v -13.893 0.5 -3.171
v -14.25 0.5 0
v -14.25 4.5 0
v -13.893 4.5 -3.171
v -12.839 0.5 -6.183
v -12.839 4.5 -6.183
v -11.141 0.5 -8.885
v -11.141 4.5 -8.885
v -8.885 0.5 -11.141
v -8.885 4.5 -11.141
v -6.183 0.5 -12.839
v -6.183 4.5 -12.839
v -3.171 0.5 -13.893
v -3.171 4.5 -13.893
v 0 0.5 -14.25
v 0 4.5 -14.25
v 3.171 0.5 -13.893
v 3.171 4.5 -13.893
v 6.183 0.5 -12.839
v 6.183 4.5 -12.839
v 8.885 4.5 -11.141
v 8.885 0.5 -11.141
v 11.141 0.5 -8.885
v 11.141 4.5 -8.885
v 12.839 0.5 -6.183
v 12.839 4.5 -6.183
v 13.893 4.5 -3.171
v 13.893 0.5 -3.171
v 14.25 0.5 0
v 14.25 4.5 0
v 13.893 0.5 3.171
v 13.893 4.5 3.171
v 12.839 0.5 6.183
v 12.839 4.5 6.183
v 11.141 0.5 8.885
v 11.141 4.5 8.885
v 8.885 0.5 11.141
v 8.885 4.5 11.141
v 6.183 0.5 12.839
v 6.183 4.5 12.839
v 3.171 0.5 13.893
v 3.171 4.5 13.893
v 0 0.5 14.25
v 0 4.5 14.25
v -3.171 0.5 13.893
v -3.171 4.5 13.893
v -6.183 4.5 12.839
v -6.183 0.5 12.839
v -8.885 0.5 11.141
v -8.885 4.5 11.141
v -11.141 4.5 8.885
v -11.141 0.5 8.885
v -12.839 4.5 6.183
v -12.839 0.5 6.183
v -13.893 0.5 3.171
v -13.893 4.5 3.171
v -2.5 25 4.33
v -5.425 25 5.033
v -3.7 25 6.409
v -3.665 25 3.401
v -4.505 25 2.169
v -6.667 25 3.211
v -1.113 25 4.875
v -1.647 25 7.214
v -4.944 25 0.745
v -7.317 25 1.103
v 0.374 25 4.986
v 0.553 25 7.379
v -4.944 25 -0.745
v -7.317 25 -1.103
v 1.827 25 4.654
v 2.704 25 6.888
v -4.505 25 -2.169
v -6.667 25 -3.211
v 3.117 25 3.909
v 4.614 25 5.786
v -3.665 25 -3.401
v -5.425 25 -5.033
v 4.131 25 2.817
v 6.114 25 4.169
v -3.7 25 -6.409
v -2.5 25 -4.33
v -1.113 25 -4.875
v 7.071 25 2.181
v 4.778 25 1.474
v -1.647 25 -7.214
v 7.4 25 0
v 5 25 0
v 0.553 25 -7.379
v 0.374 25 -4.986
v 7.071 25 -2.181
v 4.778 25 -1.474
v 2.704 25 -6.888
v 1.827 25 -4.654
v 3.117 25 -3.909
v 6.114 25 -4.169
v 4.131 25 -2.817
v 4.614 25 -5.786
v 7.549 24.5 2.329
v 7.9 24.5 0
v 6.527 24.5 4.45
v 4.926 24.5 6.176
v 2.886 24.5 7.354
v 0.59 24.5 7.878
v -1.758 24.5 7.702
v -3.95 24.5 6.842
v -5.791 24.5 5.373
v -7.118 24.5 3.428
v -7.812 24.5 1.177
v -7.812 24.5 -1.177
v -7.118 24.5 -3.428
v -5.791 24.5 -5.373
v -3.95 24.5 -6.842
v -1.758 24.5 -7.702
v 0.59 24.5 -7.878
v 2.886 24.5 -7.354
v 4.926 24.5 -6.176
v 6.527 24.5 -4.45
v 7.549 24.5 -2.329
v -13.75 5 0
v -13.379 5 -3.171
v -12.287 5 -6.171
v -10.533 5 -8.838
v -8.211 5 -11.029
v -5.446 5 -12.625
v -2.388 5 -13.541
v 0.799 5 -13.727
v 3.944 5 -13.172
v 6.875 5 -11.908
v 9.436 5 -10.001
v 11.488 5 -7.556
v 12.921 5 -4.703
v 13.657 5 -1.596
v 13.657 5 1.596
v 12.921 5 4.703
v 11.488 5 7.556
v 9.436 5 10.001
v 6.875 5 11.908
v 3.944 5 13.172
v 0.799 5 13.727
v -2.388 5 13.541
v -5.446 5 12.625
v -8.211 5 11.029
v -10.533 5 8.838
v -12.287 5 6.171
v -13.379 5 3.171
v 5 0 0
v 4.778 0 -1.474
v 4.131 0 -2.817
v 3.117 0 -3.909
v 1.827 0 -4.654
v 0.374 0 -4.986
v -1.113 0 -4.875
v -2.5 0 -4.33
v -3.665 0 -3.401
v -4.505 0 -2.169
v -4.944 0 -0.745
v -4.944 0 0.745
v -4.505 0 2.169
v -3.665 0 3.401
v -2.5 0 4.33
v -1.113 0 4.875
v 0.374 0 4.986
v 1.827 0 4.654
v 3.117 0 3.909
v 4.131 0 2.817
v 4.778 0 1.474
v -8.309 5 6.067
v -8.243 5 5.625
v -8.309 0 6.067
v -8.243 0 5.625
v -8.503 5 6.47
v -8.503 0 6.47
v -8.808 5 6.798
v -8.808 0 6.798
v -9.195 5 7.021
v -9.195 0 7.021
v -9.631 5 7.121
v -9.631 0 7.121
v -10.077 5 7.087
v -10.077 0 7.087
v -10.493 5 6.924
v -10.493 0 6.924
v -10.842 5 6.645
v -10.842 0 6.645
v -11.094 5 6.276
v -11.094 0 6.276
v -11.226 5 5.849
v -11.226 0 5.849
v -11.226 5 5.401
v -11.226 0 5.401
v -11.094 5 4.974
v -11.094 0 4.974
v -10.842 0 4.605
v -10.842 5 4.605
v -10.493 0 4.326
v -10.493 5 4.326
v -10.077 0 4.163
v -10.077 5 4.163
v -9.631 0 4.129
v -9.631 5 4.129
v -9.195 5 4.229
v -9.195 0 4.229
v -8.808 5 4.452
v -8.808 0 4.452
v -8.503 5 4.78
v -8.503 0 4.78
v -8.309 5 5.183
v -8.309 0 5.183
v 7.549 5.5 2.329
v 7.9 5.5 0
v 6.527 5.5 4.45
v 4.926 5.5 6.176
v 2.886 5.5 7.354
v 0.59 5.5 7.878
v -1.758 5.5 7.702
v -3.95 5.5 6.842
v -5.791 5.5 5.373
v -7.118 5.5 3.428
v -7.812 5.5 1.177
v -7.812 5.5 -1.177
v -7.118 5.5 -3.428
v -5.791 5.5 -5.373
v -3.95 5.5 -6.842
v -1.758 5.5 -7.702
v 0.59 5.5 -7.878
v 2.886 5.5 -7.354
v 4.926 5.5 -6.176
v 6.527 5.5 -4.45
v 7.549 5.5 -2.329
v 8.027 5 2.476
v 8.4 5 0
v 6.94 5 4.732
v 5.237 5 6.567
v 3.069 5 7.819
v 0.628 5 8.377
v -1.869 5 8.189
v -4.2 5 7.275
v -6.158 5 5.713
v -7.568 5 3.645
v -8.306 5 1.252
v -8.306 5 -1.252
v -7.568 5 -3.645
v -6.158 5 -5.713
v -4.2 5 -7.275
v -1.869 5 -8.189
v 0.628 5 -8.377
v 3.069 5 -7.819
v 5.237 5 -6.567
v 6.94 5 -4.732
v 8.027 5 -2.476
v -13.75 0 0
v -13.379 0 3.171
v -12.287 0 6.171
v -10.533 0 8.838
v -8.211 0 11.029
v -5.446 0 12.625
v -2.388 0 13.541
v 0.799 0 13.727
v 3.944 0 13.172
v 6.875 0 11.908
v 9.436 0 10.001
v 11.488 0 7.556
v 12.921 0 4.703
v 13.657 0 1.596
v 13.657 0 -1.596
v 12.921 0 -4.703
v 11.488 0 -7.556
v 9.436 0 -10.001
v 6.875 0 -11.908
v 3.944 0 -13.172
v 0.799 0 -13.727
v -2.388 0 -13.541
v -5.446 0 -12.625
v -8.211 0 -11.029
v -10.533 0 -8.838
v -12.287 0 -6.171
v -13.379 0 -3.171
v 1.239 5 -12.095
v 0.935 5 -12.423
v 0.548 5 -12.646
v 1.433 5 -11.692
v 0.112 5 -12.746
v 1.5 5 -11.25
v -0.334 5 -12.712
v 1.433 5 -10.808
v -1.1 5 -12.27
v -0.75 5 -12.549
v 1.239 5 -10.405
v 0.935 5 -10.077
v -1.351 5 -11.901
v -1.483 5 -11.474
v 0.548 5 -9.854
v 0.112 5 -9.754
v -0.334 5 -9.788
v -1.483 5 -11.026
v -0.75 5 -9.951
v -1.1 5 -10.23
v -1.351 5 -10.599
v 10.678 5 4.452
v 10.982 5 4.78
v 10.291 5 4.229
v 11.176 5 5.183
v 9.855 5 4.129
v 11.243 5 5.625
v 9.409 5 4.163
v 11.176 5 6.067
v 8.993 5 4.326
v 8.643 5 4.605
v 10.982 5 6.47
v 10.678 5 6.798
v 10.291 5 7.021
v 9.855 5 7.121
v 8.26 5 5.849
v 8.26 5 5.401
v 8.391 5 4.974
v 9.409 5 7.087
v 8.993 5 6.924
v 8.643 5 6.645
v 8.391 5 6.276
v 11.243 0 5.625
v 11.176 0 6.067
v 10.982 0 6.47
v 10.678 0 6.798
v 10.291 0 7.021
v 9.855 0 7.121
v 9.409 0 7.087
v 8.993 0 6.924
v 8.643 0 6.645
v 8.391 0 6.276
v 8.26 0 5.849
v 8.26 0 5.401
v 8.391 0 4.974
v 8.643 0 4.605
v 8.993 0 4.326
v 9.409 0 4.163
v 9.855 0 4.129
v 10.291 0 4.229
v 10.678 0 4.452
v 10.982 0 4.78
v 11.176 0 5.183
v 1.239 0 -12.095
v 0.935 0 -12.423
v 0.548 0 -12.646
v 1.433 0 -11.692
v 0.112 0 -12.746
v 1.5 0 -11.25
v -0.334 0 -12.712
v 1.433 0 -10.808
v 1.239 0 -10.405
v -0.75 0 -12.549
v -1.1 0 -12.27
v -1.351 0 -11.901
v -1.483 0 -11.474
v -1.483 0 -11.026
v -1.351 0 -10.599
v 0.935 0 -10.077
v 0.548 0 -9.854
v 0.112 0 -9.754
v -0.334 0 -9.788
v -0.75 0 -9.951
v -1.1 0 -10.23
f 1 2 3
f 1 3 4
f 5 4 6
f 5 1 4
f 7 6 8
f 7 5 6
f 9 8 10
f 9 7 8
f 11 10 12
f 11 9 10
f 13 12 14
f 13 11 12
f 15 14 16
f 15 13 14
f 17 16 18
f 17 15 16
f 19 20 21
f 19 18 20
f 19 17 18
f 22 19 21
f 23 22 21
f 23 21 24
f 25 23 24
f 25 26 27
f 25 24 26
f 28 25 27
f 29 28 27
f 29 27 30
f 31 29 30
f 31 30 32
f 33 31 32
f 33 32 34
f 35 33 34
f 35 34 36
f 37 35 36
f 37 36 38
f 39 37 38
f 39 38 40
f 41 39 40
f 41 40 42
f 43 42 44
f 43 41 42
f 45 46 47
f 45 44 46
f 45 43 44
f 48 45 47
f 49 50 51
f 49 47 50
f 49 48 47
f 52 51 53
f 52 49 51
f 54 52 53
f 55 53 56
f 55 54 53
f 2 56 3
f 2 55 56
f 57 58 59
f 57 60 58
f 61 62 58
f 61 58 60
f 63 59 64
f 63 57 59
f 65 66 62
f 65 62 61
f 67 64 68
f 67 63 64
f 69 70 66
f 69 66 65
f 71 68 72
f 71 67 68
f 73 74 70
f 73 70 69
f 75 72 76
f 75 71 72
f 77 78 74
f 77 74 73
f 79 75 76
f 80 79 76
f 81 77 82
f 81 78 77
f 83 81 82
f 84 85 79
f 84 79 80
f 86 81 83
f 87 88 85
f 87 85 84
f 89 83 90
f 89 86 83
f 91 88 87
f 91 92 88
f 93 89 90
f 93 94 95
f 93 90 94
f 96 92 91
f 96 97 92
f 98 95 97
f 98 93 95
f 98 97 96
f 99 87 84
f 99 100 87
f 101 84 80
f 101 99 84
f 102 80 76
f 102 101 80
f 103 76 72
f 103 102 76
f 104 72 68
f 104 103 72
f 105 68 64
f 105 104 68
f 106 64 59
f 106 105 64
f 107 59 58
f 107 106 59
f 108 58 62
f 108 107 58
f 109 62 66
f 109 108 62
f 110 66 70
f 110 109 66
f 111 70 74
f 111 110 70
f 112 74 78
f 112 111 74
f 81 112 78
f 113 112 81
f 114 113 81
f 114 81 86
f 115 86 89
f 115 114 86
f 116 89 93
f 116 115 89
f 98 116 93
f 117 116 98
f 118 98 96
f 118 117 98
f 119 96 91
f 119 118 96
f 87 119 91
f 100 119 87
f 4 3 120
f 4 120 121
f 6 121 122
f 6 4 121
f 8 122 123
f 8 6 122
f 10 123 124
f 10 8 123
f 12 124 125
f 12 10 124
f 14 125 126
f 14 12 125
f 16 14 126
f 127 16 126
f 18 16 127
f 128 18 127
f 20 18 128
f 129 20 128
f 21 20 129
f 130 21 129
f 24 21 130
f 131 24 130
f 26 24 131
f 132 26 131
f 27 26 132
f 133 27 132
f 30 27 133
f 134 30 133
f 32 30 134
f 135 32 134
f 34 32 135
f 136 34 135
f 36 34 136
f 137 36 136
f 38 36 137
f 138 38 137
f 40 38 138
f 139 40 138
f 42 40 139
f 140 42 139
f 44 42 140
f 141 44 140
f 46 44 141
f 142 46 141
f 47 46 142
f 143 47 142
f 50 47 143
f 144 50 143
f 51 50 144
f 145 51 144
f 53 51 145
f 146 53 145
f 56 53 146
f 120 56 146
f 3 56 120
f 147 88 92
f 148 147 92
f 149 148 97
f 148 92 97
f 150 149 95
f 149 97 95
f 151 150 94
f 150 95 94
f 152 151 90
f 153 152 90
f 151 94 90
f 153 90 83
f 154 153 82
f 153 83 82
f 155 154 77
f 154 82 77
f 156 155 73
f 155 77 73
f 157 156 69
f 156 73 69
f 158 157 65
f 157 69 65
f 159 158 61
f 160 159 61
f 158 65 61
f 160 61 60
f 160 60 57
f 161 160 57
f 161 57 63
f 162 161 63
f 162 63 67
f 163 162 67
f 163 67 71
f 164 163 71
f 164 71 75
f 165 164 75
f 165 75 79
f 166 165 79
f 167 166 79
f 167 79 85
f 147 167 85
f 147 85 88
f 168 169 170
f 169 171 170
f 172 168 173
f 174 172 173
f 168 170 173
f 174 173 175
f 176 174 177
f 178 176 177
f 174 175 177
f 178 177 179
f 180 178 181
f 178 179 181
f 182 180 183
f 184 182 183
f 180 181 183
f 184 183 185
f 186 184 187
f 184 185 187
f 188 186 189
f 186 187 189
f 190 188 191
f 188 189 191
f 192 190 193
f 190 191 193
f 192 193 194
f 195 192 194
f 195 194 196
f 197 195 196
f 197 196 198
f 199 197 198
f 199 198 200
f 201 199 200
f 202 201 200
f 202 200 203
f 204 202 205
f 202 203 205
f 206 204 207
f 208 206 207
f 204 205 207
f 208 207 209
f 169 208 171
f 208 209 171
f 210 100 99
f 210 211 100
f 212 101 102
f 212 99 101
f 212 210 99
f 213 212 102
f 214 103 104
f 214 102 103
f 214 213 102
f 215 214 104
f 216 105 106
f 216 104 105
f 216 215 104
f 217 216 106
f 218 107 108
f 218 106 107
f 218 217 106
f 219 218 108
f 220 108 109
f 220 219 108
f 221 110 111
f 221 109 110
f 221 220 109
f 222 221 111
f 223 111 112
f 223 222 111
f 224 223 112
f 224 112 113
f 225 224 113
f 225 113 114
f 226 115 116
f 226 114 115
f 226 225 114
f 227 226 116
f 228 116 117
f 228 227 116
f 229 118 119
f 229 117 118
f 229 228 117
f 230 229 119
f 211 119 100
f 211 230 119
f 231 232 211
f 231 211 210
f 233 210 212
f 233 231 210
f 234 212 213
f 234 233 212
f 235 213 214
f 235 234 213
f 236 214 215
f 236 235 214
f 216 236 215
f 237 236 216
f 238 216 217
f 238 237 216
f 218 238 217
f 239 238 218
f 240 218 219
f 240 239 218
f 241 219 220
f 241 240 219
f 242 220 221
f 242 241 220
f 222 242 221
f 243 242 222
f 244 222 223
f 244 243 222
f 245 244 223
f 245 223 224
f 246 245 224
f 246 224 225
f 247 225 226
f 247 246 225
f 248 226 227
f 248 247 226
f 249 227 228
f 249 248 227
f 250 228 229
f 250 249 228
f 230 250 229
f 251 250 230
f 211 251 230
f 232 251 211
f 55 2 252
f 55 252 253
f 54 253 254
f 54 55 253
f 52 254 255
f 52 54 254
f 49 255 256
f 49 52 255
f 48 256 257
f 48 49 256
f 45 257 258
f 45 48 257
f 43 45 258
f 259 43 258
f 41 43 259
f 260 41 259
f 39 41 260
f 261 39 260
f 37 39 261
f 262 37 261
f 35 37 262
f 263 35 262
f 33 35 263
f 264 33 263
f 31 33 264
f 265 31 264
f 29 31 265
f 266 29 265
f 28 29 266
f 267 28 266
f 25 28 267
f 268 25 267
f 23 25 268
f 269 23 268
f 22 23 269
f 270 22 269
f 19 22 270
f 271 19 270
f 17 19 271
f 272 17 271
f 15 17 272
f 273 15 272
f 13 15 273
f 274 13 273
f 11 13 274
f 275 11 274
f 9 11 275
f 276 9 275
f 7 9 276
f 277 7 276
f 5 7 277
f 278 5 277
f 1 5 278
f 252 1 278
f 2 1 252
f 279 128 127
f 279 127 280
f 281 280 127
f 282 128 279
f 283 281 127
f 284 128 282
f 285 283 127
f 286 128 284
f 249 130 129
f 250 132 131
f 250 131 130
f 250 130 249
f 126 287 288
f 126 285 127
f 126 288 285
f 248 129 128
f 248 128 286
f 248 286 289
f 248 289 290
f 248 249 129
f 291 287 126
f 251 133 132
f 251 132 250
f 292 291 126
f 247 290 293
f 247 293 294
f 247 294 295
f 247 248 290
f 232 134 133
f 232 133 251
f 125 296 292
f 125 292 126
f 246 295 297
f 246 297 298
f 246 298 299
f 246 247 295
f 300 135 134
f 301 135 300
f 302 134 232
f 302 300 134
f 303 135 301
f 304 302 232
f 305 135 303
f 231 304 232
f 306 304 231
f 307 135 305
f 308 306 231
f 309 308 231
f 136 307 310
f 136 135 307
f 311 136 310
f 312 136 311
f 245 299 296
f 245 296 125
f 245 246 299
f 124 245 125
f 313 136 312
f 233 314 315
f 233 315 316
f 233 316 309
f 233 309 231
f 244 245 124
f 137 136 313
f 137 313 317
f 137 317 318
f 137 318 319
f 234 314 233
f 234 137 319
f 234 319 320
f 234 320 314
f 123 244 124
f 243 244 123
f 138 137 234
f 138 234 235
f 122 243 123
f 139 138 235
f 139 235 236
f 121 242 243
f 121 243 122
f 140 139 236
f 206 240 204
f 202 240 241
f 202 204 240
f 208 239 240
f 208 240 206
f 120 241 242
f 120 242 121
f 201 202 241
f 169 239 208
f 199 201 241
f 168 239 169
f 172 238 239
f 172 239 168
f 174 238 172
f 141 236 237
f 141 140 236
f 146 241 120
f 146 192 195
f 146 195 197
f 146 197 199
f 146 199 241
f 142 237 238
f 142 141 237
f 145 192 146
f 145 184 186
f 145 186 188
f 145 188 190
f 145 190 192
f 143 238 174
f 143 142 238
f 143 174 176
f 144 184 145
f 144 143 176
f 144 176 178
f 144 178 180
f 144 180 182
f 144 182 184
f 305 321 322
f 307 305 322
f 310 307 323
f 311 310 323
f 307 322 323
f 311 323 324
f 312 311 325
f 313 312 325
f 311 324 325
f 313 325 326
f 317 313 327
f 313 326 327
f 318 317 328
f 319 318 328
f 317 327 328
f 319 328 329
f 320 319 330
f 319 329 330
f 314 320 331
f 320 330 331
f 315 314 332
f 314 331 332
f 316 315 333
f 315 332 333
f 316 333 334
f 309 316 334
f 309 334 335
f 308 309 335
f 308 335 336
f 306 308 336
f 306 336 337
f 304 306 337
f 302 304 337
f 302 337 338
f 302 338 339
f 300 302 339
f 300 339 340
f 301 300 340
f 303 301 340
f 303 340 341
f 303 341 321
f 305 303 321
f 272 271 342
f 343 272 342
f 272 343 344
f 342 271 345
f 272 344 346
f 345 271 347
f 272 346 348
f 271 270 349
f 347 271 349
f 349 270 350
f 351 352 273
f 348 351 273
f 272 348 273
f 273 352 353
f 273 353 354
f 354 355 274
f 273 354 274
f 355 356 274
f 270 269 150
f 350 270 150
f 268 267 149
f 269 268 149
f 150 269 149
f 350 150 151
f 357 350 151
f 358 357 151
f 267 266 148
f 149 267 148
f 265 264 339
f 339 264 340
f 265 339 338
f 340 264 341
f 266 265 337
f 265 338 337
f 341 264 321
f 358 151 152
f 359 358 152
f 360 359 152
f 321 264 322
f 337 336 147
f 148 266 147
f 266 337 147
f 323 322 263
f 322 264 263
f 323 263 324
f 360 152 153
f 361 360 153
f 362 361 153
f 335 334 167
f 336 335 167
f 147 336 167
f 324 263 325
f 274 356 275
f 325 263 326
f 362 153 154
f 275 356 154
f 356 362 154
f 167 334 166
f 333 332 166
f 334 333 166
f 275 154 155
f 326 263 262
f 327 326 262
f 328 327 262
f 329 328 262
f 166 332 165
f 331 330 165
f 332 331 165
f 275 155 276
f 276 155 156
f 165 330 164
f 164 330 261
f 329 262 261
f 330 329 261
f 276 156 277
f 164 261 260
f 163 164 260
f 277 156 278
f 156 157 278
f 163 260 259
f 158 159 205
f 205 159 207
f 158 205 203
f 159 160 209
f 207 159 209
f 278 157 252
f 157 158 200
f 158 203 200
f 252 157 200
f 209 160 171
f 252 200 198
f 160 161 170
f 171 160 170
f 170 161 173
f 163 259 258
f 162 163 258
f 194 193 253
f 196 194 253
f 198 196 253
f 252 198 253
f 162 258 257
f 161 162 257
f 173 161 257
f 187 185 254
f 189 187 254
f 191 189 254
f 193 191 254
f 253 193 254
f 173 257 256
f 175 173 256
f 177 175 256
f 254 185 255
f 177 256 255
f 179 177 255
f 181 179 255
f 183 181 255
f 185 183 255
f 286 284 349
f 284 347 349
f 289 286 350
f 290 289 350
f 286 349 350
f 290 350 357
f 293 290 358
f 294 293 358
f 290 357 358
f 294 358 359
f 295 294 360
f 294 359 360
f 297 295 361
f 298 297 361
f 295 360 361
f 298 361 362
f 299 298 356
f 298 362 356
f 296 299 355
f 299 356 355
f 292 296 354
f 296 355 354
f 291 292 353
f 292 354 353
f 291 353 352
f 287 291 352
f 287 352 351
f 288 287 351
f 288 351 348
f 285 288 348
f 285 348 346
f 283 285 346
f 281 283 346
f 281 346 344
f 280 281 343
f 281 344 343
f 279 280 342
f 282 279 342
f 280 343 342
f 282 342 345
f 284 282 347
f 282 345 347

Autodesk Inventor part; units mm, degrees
ref_plane "YZ Plane" through (0, 0, 0) normal (1, 0, 0) x (0, 1, 0)
ref_plane "XZ Plane" through (0, 0, 0) normal (0, 1, 0) x (-1, 0, 0)
ref_plane "XY Plane" through (0, 0, 0) normal (0, 0, 1) x (1, 0, 0)
sketch "Sketch1" plane through (0, 0, 0) normal (0, 1, 0) x (-1, 0, 0)
  circle A0 centre (0, 0) radius 14.25
  dimension "d0" = 28.5
extrude "Extrusion1" add sketch "Sketch1" along normal blind 5
sketch "Sketch2" plane through (0, 5, 0) normal (0, 1, 0) x (1, 0, 0)
  circle A0 centre (0, 0) radius 14.25 projected
  circle A1 centre (0, 0) radius 7.9
  dimension "d3" = 15.8
extrude "Extrusion2" add sketch "Sketch2" along normal blind 20 contours A1
sketch "Sketch3" plane through (0, 25, 0) normal (0, 1, 0) x (1, 0, 0)
  circle A0 centre (0, 0) radius 7.9 projected
  circle A1 centre (0, 0) radius 5
  dimension "d6" = 10
extrude "Extrusion3" cut sketch "Sketch3" against normal blind 25.6 contours A1
chamfer "Chamfer1" distance 0.5 angle 45 1 edges at (-7.9, 25, 0)
chamfer "Chamfer2" distance 0.5 angle 45 3 edges at (-7.9, 5, 0) (14.25, 5, 0) (14.25, 0, 0)
thread "Thread1" size "TR10x2" class "7H" standard "ISO Metric Trapezoidal Threads" full length
sketch "Sketch4" plane through (0, 0, 0) normal (0, -1, 0) x (1, 0, 0)
  circle A0 centre (0, 0) radius 13.75 projected
  line L0 (0, 0) -> (0, -13.75) construction
  line L1 (0, 0) -> (-11.9078, 6.875) construction
  line L2 (0, 0) -> (11.9078, 6.875) construction
  circle A1 centre (0, 0) radius 14.25 projected
  circle A2 centre (0, 0) radius 11.25 construction
  circle A3 centre (9.7428, 5.625) radius 1.5
  circle A4 centre (0, -11.25) radius 1.5
  circle A5 centre (-9.7428, 5.625) radius 1.5
  dimension "d17" = 120
  dimension "d18" = 120
  dimension "d22" = 22.5
  dimension "d23" = 3
  dimension "d24" = 3
  dimension "d25" = 3
extrude "Extrusion4" cut sketch "Sketch4" against normal blind 5 contours A3 | A4 | A5
properties part number "ZACMENut" material "ABS Plastic"
